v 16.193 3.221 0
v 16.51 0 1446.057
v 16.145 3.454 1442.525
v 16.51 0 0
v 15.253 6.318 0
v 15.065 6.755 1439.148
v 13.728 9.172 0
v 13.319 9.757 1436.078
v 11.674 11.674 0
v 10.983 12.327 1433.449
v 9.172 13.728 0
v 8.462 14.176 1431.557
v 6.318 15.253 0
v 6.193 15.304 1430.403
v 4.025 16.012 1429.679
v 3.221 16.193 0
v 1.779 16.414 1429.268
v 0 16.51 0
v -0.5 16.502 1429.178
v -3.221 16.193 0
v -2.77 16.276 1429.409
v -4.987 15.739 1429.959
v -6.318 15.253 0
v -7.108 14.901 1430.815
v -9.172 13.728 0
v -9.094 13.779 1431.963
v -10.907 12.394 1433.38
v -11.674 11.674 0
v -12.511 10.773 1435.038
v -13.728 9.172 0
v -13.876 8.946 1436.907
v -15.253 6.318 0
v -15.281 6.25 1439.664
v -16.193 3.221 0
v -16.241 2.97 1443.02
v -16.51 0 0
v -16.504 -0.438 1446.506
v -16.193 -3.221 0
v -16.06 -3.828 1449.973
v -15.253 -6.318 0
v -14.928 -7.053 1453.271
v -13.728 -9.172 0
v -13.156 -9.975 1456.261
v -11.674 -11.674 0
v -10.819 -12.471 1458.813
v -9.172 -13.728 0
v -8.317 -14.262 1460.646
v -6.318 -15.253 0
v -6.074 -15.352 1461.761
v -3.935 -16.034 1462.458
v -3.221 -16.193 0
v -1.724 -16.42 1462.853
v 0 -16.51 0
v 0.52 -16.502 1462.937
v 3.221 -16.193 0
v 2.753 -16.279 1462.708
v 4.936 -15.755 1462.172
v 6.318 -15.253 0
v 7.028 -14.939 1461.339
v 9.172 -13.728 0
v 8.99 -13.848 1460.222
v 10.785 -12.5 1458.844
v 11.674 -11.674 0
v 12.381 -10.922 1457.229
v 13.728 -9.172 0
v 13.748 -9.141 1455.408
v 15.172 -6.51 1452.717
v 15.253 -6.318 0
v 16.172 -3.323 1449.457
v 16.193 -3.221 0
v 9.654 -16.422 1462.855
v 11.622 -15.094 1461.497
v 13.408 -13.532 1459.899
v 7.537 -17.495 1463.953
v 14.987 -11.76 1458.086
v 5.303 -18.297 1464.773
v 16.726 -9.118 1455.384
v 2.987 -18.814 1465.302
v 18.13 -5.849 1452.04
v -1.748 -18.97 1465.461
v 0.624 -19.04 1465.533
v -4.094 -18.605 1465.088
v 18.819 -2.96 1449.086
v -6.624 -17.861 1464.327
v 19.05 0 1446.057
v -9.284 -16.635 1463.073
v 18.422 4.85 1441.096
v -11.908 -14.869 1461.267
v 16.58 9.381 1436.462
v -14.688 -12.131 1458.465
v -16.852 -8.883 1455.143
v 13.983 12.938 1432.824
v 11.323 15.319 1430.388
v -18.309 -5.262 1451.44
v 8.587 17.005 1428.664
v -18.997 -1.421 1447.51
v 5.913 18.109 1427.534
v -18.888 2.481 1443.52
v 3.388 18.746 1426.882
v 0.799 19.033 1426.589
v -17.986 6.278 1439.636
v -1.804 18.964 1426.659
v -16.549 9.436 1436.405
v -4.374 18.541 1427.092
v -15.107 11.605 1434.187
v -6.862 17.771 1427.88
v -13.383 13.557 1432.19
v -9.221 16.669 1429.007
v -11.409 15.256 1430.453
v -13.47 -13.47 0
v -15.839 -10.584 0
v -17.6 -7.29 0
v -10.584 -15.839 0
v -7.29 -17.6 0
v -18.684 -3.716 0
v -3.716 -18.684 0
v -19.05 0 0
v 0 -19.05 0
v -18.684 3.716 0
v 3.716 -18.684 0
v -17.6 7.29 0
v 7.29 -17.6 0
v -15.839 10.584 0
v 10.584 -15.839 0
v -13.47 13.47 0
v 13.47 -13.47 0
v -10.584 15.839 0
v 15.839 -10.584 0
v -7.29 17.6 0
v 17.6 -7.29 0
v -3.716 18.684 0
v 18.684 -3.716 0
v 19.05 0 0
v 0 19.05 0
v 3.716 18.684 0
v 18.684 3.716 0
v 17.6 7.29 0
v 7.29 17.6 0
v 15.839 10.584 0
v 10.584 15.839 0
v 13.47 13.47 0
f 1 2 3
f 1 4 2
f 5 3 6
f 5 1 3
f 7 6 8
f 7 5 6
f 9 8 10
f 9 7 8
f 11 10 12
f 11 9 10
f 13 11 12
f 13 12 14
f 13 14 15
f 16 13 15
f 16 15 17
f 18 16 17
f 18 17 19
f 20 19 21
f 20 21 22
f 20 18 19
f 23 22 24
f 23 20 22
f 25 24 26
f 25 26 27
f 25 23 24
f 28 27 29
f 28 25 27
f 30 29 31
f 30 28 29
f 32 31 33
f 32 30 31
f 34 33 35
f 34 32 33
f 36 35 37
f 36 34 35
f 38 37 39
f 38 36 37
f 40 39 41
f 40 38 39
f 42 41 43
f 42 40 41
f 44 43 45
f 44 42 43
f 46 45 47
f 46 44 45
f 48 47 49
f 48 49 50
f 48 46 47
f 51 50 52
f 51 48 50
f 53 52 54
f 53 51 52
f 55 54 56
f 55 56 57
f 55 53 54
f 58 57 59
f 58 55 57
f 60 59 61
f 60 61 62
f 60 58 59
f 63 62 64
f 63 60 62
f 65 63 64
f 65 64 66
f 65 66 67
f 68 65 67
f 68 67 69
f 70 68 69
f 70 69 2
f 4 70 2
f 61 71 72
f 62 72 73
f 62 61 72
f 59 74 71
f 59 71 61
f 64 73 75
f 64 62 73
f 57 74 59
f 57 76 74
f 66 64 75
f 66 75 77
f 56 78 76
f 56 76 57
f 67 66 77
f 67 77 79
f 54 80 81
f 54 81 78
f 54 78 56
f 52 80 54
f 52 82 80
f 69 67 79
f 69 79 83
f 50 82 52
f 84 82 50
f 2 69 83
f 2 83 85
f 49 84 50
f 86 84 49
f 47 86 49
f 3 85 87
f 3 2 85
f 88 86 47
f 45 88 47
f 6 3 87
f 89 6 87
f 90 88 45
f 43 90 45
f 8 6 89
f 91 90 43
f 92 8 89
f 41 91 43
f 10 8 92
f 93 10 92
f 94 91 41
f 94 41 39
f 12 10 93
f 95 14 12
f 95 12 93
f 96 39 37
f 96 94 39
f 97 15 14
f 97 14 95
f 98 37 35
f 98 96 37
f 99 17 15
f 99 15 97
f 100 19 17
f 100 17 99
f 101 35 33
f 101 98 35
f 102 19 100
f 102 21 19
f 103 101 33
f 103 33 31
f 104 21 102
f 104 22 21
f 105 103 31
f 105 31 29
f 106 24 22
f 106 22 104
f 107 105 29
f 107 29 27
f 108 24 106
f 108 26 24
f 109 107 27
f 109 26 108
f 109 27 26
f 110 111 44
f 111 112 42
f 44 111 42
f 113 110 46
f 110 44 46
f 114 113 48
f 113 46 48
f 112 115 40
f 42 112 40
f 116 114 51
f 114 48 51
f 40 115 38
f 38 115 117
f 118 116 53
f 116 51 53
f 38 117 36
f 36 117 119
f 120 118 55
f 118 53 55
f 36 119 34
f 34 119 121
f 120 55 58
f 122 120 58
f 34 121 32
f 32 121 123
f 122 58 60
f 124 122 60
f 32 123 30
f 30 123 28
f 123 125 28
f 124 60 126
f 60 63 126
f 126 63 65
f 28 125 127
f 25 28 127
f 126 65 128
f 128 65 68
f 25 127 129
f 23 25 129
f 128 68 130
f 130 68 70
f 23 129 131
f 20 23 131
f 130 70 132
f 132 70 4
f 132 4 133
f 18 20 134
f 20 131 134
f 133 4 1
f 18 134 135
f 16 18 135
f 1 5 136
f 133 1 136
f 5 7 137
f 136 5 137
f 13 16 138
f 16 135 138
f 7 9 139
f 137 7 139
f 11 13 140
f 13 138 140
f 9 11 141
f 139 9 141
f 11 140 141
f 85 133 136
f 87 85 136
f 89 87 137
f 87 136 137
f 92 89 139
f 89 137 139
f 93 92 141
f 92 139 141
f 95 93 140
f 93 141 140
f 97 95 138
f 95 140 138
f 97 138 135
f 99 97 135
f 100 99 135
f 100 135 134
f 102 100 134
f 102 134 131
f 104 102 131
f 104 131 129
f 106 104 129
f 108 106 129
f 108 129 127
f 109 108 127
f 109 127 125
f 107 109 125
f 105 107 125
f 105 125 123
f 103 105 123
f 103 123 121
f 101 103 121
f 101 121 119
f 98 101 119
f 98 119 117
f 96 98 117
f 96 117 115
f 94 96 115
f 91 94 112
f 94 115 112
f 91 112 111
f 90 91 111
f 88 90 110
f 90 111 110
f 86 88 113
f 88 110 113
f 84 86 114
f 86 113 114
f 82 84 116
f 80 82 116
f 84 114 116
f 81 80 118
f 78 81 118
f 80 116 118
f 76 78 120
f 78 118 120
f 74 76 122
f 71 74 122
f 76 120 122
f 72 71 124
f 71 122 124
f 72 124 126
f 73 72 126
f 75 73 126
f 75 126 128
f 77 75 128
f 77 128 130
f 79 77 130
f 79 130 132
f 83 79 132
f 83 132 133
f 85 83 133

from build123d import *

# Parameters (mm, degrees)
SKETCH1_R               = 19.05
BOSS_EXTRUDE1_DEPTH     = 1524
SHELL1_T                = -2.54
CUT_EXTRUDE1_DEPTH      = 127
CUT_EXTRUDE1_DEPTH_BACK = 127
SKETCH2_OUTSIDE_W       = 1830.99
SKETCH2_OUTSIDE_H       = 345.09


with BuildPart() as part:
    # Sketch1 → Boss-Extrude1 (new body)
    with BuildSketch(Plane.XY):
        Circle(SKETCH1_R)
    extrude(amount=BOSS_EXTRUDE1_DEPTH)

    # Shell1
    shell1_openings = [part.faces().sort_by_distance(p)[0] for p in [
        (0, 0, 0),
    ]]
    offset(amount=SHELL1_T, openings=shell1_openings, kind=Kind.INTERSECTION)

    # Sketch2 outside → Cut-Extrude1 (cut, two sides: drawn at the far end of the back side and taken through both)
    with BuildSketch(Plane(origin=(0, 0, 0), x_dir=(0, 0, -1), z_dir=(1, 0, 0)).offset(-CUT_EXTRUDE1_DEPTH_BACK)):
        with Locations((-762, 0)):
            Rectangle(SKETCH2_OUTSIDE_W, SKETCH2_OUTSIDE_H)
        Polygon((-1524, -76.2), (-1368.114799795, 76.2), (0, 76.2), (0, -76.2), align=None, mode=Mode.SUBTRACT)
    extrude(amount=CUT_EXTRUDE1_DEPTH + CUT_EXTRUDE1_DEPTH_BACK, mode=Mode.SUBTRACT)


solid = part.part
